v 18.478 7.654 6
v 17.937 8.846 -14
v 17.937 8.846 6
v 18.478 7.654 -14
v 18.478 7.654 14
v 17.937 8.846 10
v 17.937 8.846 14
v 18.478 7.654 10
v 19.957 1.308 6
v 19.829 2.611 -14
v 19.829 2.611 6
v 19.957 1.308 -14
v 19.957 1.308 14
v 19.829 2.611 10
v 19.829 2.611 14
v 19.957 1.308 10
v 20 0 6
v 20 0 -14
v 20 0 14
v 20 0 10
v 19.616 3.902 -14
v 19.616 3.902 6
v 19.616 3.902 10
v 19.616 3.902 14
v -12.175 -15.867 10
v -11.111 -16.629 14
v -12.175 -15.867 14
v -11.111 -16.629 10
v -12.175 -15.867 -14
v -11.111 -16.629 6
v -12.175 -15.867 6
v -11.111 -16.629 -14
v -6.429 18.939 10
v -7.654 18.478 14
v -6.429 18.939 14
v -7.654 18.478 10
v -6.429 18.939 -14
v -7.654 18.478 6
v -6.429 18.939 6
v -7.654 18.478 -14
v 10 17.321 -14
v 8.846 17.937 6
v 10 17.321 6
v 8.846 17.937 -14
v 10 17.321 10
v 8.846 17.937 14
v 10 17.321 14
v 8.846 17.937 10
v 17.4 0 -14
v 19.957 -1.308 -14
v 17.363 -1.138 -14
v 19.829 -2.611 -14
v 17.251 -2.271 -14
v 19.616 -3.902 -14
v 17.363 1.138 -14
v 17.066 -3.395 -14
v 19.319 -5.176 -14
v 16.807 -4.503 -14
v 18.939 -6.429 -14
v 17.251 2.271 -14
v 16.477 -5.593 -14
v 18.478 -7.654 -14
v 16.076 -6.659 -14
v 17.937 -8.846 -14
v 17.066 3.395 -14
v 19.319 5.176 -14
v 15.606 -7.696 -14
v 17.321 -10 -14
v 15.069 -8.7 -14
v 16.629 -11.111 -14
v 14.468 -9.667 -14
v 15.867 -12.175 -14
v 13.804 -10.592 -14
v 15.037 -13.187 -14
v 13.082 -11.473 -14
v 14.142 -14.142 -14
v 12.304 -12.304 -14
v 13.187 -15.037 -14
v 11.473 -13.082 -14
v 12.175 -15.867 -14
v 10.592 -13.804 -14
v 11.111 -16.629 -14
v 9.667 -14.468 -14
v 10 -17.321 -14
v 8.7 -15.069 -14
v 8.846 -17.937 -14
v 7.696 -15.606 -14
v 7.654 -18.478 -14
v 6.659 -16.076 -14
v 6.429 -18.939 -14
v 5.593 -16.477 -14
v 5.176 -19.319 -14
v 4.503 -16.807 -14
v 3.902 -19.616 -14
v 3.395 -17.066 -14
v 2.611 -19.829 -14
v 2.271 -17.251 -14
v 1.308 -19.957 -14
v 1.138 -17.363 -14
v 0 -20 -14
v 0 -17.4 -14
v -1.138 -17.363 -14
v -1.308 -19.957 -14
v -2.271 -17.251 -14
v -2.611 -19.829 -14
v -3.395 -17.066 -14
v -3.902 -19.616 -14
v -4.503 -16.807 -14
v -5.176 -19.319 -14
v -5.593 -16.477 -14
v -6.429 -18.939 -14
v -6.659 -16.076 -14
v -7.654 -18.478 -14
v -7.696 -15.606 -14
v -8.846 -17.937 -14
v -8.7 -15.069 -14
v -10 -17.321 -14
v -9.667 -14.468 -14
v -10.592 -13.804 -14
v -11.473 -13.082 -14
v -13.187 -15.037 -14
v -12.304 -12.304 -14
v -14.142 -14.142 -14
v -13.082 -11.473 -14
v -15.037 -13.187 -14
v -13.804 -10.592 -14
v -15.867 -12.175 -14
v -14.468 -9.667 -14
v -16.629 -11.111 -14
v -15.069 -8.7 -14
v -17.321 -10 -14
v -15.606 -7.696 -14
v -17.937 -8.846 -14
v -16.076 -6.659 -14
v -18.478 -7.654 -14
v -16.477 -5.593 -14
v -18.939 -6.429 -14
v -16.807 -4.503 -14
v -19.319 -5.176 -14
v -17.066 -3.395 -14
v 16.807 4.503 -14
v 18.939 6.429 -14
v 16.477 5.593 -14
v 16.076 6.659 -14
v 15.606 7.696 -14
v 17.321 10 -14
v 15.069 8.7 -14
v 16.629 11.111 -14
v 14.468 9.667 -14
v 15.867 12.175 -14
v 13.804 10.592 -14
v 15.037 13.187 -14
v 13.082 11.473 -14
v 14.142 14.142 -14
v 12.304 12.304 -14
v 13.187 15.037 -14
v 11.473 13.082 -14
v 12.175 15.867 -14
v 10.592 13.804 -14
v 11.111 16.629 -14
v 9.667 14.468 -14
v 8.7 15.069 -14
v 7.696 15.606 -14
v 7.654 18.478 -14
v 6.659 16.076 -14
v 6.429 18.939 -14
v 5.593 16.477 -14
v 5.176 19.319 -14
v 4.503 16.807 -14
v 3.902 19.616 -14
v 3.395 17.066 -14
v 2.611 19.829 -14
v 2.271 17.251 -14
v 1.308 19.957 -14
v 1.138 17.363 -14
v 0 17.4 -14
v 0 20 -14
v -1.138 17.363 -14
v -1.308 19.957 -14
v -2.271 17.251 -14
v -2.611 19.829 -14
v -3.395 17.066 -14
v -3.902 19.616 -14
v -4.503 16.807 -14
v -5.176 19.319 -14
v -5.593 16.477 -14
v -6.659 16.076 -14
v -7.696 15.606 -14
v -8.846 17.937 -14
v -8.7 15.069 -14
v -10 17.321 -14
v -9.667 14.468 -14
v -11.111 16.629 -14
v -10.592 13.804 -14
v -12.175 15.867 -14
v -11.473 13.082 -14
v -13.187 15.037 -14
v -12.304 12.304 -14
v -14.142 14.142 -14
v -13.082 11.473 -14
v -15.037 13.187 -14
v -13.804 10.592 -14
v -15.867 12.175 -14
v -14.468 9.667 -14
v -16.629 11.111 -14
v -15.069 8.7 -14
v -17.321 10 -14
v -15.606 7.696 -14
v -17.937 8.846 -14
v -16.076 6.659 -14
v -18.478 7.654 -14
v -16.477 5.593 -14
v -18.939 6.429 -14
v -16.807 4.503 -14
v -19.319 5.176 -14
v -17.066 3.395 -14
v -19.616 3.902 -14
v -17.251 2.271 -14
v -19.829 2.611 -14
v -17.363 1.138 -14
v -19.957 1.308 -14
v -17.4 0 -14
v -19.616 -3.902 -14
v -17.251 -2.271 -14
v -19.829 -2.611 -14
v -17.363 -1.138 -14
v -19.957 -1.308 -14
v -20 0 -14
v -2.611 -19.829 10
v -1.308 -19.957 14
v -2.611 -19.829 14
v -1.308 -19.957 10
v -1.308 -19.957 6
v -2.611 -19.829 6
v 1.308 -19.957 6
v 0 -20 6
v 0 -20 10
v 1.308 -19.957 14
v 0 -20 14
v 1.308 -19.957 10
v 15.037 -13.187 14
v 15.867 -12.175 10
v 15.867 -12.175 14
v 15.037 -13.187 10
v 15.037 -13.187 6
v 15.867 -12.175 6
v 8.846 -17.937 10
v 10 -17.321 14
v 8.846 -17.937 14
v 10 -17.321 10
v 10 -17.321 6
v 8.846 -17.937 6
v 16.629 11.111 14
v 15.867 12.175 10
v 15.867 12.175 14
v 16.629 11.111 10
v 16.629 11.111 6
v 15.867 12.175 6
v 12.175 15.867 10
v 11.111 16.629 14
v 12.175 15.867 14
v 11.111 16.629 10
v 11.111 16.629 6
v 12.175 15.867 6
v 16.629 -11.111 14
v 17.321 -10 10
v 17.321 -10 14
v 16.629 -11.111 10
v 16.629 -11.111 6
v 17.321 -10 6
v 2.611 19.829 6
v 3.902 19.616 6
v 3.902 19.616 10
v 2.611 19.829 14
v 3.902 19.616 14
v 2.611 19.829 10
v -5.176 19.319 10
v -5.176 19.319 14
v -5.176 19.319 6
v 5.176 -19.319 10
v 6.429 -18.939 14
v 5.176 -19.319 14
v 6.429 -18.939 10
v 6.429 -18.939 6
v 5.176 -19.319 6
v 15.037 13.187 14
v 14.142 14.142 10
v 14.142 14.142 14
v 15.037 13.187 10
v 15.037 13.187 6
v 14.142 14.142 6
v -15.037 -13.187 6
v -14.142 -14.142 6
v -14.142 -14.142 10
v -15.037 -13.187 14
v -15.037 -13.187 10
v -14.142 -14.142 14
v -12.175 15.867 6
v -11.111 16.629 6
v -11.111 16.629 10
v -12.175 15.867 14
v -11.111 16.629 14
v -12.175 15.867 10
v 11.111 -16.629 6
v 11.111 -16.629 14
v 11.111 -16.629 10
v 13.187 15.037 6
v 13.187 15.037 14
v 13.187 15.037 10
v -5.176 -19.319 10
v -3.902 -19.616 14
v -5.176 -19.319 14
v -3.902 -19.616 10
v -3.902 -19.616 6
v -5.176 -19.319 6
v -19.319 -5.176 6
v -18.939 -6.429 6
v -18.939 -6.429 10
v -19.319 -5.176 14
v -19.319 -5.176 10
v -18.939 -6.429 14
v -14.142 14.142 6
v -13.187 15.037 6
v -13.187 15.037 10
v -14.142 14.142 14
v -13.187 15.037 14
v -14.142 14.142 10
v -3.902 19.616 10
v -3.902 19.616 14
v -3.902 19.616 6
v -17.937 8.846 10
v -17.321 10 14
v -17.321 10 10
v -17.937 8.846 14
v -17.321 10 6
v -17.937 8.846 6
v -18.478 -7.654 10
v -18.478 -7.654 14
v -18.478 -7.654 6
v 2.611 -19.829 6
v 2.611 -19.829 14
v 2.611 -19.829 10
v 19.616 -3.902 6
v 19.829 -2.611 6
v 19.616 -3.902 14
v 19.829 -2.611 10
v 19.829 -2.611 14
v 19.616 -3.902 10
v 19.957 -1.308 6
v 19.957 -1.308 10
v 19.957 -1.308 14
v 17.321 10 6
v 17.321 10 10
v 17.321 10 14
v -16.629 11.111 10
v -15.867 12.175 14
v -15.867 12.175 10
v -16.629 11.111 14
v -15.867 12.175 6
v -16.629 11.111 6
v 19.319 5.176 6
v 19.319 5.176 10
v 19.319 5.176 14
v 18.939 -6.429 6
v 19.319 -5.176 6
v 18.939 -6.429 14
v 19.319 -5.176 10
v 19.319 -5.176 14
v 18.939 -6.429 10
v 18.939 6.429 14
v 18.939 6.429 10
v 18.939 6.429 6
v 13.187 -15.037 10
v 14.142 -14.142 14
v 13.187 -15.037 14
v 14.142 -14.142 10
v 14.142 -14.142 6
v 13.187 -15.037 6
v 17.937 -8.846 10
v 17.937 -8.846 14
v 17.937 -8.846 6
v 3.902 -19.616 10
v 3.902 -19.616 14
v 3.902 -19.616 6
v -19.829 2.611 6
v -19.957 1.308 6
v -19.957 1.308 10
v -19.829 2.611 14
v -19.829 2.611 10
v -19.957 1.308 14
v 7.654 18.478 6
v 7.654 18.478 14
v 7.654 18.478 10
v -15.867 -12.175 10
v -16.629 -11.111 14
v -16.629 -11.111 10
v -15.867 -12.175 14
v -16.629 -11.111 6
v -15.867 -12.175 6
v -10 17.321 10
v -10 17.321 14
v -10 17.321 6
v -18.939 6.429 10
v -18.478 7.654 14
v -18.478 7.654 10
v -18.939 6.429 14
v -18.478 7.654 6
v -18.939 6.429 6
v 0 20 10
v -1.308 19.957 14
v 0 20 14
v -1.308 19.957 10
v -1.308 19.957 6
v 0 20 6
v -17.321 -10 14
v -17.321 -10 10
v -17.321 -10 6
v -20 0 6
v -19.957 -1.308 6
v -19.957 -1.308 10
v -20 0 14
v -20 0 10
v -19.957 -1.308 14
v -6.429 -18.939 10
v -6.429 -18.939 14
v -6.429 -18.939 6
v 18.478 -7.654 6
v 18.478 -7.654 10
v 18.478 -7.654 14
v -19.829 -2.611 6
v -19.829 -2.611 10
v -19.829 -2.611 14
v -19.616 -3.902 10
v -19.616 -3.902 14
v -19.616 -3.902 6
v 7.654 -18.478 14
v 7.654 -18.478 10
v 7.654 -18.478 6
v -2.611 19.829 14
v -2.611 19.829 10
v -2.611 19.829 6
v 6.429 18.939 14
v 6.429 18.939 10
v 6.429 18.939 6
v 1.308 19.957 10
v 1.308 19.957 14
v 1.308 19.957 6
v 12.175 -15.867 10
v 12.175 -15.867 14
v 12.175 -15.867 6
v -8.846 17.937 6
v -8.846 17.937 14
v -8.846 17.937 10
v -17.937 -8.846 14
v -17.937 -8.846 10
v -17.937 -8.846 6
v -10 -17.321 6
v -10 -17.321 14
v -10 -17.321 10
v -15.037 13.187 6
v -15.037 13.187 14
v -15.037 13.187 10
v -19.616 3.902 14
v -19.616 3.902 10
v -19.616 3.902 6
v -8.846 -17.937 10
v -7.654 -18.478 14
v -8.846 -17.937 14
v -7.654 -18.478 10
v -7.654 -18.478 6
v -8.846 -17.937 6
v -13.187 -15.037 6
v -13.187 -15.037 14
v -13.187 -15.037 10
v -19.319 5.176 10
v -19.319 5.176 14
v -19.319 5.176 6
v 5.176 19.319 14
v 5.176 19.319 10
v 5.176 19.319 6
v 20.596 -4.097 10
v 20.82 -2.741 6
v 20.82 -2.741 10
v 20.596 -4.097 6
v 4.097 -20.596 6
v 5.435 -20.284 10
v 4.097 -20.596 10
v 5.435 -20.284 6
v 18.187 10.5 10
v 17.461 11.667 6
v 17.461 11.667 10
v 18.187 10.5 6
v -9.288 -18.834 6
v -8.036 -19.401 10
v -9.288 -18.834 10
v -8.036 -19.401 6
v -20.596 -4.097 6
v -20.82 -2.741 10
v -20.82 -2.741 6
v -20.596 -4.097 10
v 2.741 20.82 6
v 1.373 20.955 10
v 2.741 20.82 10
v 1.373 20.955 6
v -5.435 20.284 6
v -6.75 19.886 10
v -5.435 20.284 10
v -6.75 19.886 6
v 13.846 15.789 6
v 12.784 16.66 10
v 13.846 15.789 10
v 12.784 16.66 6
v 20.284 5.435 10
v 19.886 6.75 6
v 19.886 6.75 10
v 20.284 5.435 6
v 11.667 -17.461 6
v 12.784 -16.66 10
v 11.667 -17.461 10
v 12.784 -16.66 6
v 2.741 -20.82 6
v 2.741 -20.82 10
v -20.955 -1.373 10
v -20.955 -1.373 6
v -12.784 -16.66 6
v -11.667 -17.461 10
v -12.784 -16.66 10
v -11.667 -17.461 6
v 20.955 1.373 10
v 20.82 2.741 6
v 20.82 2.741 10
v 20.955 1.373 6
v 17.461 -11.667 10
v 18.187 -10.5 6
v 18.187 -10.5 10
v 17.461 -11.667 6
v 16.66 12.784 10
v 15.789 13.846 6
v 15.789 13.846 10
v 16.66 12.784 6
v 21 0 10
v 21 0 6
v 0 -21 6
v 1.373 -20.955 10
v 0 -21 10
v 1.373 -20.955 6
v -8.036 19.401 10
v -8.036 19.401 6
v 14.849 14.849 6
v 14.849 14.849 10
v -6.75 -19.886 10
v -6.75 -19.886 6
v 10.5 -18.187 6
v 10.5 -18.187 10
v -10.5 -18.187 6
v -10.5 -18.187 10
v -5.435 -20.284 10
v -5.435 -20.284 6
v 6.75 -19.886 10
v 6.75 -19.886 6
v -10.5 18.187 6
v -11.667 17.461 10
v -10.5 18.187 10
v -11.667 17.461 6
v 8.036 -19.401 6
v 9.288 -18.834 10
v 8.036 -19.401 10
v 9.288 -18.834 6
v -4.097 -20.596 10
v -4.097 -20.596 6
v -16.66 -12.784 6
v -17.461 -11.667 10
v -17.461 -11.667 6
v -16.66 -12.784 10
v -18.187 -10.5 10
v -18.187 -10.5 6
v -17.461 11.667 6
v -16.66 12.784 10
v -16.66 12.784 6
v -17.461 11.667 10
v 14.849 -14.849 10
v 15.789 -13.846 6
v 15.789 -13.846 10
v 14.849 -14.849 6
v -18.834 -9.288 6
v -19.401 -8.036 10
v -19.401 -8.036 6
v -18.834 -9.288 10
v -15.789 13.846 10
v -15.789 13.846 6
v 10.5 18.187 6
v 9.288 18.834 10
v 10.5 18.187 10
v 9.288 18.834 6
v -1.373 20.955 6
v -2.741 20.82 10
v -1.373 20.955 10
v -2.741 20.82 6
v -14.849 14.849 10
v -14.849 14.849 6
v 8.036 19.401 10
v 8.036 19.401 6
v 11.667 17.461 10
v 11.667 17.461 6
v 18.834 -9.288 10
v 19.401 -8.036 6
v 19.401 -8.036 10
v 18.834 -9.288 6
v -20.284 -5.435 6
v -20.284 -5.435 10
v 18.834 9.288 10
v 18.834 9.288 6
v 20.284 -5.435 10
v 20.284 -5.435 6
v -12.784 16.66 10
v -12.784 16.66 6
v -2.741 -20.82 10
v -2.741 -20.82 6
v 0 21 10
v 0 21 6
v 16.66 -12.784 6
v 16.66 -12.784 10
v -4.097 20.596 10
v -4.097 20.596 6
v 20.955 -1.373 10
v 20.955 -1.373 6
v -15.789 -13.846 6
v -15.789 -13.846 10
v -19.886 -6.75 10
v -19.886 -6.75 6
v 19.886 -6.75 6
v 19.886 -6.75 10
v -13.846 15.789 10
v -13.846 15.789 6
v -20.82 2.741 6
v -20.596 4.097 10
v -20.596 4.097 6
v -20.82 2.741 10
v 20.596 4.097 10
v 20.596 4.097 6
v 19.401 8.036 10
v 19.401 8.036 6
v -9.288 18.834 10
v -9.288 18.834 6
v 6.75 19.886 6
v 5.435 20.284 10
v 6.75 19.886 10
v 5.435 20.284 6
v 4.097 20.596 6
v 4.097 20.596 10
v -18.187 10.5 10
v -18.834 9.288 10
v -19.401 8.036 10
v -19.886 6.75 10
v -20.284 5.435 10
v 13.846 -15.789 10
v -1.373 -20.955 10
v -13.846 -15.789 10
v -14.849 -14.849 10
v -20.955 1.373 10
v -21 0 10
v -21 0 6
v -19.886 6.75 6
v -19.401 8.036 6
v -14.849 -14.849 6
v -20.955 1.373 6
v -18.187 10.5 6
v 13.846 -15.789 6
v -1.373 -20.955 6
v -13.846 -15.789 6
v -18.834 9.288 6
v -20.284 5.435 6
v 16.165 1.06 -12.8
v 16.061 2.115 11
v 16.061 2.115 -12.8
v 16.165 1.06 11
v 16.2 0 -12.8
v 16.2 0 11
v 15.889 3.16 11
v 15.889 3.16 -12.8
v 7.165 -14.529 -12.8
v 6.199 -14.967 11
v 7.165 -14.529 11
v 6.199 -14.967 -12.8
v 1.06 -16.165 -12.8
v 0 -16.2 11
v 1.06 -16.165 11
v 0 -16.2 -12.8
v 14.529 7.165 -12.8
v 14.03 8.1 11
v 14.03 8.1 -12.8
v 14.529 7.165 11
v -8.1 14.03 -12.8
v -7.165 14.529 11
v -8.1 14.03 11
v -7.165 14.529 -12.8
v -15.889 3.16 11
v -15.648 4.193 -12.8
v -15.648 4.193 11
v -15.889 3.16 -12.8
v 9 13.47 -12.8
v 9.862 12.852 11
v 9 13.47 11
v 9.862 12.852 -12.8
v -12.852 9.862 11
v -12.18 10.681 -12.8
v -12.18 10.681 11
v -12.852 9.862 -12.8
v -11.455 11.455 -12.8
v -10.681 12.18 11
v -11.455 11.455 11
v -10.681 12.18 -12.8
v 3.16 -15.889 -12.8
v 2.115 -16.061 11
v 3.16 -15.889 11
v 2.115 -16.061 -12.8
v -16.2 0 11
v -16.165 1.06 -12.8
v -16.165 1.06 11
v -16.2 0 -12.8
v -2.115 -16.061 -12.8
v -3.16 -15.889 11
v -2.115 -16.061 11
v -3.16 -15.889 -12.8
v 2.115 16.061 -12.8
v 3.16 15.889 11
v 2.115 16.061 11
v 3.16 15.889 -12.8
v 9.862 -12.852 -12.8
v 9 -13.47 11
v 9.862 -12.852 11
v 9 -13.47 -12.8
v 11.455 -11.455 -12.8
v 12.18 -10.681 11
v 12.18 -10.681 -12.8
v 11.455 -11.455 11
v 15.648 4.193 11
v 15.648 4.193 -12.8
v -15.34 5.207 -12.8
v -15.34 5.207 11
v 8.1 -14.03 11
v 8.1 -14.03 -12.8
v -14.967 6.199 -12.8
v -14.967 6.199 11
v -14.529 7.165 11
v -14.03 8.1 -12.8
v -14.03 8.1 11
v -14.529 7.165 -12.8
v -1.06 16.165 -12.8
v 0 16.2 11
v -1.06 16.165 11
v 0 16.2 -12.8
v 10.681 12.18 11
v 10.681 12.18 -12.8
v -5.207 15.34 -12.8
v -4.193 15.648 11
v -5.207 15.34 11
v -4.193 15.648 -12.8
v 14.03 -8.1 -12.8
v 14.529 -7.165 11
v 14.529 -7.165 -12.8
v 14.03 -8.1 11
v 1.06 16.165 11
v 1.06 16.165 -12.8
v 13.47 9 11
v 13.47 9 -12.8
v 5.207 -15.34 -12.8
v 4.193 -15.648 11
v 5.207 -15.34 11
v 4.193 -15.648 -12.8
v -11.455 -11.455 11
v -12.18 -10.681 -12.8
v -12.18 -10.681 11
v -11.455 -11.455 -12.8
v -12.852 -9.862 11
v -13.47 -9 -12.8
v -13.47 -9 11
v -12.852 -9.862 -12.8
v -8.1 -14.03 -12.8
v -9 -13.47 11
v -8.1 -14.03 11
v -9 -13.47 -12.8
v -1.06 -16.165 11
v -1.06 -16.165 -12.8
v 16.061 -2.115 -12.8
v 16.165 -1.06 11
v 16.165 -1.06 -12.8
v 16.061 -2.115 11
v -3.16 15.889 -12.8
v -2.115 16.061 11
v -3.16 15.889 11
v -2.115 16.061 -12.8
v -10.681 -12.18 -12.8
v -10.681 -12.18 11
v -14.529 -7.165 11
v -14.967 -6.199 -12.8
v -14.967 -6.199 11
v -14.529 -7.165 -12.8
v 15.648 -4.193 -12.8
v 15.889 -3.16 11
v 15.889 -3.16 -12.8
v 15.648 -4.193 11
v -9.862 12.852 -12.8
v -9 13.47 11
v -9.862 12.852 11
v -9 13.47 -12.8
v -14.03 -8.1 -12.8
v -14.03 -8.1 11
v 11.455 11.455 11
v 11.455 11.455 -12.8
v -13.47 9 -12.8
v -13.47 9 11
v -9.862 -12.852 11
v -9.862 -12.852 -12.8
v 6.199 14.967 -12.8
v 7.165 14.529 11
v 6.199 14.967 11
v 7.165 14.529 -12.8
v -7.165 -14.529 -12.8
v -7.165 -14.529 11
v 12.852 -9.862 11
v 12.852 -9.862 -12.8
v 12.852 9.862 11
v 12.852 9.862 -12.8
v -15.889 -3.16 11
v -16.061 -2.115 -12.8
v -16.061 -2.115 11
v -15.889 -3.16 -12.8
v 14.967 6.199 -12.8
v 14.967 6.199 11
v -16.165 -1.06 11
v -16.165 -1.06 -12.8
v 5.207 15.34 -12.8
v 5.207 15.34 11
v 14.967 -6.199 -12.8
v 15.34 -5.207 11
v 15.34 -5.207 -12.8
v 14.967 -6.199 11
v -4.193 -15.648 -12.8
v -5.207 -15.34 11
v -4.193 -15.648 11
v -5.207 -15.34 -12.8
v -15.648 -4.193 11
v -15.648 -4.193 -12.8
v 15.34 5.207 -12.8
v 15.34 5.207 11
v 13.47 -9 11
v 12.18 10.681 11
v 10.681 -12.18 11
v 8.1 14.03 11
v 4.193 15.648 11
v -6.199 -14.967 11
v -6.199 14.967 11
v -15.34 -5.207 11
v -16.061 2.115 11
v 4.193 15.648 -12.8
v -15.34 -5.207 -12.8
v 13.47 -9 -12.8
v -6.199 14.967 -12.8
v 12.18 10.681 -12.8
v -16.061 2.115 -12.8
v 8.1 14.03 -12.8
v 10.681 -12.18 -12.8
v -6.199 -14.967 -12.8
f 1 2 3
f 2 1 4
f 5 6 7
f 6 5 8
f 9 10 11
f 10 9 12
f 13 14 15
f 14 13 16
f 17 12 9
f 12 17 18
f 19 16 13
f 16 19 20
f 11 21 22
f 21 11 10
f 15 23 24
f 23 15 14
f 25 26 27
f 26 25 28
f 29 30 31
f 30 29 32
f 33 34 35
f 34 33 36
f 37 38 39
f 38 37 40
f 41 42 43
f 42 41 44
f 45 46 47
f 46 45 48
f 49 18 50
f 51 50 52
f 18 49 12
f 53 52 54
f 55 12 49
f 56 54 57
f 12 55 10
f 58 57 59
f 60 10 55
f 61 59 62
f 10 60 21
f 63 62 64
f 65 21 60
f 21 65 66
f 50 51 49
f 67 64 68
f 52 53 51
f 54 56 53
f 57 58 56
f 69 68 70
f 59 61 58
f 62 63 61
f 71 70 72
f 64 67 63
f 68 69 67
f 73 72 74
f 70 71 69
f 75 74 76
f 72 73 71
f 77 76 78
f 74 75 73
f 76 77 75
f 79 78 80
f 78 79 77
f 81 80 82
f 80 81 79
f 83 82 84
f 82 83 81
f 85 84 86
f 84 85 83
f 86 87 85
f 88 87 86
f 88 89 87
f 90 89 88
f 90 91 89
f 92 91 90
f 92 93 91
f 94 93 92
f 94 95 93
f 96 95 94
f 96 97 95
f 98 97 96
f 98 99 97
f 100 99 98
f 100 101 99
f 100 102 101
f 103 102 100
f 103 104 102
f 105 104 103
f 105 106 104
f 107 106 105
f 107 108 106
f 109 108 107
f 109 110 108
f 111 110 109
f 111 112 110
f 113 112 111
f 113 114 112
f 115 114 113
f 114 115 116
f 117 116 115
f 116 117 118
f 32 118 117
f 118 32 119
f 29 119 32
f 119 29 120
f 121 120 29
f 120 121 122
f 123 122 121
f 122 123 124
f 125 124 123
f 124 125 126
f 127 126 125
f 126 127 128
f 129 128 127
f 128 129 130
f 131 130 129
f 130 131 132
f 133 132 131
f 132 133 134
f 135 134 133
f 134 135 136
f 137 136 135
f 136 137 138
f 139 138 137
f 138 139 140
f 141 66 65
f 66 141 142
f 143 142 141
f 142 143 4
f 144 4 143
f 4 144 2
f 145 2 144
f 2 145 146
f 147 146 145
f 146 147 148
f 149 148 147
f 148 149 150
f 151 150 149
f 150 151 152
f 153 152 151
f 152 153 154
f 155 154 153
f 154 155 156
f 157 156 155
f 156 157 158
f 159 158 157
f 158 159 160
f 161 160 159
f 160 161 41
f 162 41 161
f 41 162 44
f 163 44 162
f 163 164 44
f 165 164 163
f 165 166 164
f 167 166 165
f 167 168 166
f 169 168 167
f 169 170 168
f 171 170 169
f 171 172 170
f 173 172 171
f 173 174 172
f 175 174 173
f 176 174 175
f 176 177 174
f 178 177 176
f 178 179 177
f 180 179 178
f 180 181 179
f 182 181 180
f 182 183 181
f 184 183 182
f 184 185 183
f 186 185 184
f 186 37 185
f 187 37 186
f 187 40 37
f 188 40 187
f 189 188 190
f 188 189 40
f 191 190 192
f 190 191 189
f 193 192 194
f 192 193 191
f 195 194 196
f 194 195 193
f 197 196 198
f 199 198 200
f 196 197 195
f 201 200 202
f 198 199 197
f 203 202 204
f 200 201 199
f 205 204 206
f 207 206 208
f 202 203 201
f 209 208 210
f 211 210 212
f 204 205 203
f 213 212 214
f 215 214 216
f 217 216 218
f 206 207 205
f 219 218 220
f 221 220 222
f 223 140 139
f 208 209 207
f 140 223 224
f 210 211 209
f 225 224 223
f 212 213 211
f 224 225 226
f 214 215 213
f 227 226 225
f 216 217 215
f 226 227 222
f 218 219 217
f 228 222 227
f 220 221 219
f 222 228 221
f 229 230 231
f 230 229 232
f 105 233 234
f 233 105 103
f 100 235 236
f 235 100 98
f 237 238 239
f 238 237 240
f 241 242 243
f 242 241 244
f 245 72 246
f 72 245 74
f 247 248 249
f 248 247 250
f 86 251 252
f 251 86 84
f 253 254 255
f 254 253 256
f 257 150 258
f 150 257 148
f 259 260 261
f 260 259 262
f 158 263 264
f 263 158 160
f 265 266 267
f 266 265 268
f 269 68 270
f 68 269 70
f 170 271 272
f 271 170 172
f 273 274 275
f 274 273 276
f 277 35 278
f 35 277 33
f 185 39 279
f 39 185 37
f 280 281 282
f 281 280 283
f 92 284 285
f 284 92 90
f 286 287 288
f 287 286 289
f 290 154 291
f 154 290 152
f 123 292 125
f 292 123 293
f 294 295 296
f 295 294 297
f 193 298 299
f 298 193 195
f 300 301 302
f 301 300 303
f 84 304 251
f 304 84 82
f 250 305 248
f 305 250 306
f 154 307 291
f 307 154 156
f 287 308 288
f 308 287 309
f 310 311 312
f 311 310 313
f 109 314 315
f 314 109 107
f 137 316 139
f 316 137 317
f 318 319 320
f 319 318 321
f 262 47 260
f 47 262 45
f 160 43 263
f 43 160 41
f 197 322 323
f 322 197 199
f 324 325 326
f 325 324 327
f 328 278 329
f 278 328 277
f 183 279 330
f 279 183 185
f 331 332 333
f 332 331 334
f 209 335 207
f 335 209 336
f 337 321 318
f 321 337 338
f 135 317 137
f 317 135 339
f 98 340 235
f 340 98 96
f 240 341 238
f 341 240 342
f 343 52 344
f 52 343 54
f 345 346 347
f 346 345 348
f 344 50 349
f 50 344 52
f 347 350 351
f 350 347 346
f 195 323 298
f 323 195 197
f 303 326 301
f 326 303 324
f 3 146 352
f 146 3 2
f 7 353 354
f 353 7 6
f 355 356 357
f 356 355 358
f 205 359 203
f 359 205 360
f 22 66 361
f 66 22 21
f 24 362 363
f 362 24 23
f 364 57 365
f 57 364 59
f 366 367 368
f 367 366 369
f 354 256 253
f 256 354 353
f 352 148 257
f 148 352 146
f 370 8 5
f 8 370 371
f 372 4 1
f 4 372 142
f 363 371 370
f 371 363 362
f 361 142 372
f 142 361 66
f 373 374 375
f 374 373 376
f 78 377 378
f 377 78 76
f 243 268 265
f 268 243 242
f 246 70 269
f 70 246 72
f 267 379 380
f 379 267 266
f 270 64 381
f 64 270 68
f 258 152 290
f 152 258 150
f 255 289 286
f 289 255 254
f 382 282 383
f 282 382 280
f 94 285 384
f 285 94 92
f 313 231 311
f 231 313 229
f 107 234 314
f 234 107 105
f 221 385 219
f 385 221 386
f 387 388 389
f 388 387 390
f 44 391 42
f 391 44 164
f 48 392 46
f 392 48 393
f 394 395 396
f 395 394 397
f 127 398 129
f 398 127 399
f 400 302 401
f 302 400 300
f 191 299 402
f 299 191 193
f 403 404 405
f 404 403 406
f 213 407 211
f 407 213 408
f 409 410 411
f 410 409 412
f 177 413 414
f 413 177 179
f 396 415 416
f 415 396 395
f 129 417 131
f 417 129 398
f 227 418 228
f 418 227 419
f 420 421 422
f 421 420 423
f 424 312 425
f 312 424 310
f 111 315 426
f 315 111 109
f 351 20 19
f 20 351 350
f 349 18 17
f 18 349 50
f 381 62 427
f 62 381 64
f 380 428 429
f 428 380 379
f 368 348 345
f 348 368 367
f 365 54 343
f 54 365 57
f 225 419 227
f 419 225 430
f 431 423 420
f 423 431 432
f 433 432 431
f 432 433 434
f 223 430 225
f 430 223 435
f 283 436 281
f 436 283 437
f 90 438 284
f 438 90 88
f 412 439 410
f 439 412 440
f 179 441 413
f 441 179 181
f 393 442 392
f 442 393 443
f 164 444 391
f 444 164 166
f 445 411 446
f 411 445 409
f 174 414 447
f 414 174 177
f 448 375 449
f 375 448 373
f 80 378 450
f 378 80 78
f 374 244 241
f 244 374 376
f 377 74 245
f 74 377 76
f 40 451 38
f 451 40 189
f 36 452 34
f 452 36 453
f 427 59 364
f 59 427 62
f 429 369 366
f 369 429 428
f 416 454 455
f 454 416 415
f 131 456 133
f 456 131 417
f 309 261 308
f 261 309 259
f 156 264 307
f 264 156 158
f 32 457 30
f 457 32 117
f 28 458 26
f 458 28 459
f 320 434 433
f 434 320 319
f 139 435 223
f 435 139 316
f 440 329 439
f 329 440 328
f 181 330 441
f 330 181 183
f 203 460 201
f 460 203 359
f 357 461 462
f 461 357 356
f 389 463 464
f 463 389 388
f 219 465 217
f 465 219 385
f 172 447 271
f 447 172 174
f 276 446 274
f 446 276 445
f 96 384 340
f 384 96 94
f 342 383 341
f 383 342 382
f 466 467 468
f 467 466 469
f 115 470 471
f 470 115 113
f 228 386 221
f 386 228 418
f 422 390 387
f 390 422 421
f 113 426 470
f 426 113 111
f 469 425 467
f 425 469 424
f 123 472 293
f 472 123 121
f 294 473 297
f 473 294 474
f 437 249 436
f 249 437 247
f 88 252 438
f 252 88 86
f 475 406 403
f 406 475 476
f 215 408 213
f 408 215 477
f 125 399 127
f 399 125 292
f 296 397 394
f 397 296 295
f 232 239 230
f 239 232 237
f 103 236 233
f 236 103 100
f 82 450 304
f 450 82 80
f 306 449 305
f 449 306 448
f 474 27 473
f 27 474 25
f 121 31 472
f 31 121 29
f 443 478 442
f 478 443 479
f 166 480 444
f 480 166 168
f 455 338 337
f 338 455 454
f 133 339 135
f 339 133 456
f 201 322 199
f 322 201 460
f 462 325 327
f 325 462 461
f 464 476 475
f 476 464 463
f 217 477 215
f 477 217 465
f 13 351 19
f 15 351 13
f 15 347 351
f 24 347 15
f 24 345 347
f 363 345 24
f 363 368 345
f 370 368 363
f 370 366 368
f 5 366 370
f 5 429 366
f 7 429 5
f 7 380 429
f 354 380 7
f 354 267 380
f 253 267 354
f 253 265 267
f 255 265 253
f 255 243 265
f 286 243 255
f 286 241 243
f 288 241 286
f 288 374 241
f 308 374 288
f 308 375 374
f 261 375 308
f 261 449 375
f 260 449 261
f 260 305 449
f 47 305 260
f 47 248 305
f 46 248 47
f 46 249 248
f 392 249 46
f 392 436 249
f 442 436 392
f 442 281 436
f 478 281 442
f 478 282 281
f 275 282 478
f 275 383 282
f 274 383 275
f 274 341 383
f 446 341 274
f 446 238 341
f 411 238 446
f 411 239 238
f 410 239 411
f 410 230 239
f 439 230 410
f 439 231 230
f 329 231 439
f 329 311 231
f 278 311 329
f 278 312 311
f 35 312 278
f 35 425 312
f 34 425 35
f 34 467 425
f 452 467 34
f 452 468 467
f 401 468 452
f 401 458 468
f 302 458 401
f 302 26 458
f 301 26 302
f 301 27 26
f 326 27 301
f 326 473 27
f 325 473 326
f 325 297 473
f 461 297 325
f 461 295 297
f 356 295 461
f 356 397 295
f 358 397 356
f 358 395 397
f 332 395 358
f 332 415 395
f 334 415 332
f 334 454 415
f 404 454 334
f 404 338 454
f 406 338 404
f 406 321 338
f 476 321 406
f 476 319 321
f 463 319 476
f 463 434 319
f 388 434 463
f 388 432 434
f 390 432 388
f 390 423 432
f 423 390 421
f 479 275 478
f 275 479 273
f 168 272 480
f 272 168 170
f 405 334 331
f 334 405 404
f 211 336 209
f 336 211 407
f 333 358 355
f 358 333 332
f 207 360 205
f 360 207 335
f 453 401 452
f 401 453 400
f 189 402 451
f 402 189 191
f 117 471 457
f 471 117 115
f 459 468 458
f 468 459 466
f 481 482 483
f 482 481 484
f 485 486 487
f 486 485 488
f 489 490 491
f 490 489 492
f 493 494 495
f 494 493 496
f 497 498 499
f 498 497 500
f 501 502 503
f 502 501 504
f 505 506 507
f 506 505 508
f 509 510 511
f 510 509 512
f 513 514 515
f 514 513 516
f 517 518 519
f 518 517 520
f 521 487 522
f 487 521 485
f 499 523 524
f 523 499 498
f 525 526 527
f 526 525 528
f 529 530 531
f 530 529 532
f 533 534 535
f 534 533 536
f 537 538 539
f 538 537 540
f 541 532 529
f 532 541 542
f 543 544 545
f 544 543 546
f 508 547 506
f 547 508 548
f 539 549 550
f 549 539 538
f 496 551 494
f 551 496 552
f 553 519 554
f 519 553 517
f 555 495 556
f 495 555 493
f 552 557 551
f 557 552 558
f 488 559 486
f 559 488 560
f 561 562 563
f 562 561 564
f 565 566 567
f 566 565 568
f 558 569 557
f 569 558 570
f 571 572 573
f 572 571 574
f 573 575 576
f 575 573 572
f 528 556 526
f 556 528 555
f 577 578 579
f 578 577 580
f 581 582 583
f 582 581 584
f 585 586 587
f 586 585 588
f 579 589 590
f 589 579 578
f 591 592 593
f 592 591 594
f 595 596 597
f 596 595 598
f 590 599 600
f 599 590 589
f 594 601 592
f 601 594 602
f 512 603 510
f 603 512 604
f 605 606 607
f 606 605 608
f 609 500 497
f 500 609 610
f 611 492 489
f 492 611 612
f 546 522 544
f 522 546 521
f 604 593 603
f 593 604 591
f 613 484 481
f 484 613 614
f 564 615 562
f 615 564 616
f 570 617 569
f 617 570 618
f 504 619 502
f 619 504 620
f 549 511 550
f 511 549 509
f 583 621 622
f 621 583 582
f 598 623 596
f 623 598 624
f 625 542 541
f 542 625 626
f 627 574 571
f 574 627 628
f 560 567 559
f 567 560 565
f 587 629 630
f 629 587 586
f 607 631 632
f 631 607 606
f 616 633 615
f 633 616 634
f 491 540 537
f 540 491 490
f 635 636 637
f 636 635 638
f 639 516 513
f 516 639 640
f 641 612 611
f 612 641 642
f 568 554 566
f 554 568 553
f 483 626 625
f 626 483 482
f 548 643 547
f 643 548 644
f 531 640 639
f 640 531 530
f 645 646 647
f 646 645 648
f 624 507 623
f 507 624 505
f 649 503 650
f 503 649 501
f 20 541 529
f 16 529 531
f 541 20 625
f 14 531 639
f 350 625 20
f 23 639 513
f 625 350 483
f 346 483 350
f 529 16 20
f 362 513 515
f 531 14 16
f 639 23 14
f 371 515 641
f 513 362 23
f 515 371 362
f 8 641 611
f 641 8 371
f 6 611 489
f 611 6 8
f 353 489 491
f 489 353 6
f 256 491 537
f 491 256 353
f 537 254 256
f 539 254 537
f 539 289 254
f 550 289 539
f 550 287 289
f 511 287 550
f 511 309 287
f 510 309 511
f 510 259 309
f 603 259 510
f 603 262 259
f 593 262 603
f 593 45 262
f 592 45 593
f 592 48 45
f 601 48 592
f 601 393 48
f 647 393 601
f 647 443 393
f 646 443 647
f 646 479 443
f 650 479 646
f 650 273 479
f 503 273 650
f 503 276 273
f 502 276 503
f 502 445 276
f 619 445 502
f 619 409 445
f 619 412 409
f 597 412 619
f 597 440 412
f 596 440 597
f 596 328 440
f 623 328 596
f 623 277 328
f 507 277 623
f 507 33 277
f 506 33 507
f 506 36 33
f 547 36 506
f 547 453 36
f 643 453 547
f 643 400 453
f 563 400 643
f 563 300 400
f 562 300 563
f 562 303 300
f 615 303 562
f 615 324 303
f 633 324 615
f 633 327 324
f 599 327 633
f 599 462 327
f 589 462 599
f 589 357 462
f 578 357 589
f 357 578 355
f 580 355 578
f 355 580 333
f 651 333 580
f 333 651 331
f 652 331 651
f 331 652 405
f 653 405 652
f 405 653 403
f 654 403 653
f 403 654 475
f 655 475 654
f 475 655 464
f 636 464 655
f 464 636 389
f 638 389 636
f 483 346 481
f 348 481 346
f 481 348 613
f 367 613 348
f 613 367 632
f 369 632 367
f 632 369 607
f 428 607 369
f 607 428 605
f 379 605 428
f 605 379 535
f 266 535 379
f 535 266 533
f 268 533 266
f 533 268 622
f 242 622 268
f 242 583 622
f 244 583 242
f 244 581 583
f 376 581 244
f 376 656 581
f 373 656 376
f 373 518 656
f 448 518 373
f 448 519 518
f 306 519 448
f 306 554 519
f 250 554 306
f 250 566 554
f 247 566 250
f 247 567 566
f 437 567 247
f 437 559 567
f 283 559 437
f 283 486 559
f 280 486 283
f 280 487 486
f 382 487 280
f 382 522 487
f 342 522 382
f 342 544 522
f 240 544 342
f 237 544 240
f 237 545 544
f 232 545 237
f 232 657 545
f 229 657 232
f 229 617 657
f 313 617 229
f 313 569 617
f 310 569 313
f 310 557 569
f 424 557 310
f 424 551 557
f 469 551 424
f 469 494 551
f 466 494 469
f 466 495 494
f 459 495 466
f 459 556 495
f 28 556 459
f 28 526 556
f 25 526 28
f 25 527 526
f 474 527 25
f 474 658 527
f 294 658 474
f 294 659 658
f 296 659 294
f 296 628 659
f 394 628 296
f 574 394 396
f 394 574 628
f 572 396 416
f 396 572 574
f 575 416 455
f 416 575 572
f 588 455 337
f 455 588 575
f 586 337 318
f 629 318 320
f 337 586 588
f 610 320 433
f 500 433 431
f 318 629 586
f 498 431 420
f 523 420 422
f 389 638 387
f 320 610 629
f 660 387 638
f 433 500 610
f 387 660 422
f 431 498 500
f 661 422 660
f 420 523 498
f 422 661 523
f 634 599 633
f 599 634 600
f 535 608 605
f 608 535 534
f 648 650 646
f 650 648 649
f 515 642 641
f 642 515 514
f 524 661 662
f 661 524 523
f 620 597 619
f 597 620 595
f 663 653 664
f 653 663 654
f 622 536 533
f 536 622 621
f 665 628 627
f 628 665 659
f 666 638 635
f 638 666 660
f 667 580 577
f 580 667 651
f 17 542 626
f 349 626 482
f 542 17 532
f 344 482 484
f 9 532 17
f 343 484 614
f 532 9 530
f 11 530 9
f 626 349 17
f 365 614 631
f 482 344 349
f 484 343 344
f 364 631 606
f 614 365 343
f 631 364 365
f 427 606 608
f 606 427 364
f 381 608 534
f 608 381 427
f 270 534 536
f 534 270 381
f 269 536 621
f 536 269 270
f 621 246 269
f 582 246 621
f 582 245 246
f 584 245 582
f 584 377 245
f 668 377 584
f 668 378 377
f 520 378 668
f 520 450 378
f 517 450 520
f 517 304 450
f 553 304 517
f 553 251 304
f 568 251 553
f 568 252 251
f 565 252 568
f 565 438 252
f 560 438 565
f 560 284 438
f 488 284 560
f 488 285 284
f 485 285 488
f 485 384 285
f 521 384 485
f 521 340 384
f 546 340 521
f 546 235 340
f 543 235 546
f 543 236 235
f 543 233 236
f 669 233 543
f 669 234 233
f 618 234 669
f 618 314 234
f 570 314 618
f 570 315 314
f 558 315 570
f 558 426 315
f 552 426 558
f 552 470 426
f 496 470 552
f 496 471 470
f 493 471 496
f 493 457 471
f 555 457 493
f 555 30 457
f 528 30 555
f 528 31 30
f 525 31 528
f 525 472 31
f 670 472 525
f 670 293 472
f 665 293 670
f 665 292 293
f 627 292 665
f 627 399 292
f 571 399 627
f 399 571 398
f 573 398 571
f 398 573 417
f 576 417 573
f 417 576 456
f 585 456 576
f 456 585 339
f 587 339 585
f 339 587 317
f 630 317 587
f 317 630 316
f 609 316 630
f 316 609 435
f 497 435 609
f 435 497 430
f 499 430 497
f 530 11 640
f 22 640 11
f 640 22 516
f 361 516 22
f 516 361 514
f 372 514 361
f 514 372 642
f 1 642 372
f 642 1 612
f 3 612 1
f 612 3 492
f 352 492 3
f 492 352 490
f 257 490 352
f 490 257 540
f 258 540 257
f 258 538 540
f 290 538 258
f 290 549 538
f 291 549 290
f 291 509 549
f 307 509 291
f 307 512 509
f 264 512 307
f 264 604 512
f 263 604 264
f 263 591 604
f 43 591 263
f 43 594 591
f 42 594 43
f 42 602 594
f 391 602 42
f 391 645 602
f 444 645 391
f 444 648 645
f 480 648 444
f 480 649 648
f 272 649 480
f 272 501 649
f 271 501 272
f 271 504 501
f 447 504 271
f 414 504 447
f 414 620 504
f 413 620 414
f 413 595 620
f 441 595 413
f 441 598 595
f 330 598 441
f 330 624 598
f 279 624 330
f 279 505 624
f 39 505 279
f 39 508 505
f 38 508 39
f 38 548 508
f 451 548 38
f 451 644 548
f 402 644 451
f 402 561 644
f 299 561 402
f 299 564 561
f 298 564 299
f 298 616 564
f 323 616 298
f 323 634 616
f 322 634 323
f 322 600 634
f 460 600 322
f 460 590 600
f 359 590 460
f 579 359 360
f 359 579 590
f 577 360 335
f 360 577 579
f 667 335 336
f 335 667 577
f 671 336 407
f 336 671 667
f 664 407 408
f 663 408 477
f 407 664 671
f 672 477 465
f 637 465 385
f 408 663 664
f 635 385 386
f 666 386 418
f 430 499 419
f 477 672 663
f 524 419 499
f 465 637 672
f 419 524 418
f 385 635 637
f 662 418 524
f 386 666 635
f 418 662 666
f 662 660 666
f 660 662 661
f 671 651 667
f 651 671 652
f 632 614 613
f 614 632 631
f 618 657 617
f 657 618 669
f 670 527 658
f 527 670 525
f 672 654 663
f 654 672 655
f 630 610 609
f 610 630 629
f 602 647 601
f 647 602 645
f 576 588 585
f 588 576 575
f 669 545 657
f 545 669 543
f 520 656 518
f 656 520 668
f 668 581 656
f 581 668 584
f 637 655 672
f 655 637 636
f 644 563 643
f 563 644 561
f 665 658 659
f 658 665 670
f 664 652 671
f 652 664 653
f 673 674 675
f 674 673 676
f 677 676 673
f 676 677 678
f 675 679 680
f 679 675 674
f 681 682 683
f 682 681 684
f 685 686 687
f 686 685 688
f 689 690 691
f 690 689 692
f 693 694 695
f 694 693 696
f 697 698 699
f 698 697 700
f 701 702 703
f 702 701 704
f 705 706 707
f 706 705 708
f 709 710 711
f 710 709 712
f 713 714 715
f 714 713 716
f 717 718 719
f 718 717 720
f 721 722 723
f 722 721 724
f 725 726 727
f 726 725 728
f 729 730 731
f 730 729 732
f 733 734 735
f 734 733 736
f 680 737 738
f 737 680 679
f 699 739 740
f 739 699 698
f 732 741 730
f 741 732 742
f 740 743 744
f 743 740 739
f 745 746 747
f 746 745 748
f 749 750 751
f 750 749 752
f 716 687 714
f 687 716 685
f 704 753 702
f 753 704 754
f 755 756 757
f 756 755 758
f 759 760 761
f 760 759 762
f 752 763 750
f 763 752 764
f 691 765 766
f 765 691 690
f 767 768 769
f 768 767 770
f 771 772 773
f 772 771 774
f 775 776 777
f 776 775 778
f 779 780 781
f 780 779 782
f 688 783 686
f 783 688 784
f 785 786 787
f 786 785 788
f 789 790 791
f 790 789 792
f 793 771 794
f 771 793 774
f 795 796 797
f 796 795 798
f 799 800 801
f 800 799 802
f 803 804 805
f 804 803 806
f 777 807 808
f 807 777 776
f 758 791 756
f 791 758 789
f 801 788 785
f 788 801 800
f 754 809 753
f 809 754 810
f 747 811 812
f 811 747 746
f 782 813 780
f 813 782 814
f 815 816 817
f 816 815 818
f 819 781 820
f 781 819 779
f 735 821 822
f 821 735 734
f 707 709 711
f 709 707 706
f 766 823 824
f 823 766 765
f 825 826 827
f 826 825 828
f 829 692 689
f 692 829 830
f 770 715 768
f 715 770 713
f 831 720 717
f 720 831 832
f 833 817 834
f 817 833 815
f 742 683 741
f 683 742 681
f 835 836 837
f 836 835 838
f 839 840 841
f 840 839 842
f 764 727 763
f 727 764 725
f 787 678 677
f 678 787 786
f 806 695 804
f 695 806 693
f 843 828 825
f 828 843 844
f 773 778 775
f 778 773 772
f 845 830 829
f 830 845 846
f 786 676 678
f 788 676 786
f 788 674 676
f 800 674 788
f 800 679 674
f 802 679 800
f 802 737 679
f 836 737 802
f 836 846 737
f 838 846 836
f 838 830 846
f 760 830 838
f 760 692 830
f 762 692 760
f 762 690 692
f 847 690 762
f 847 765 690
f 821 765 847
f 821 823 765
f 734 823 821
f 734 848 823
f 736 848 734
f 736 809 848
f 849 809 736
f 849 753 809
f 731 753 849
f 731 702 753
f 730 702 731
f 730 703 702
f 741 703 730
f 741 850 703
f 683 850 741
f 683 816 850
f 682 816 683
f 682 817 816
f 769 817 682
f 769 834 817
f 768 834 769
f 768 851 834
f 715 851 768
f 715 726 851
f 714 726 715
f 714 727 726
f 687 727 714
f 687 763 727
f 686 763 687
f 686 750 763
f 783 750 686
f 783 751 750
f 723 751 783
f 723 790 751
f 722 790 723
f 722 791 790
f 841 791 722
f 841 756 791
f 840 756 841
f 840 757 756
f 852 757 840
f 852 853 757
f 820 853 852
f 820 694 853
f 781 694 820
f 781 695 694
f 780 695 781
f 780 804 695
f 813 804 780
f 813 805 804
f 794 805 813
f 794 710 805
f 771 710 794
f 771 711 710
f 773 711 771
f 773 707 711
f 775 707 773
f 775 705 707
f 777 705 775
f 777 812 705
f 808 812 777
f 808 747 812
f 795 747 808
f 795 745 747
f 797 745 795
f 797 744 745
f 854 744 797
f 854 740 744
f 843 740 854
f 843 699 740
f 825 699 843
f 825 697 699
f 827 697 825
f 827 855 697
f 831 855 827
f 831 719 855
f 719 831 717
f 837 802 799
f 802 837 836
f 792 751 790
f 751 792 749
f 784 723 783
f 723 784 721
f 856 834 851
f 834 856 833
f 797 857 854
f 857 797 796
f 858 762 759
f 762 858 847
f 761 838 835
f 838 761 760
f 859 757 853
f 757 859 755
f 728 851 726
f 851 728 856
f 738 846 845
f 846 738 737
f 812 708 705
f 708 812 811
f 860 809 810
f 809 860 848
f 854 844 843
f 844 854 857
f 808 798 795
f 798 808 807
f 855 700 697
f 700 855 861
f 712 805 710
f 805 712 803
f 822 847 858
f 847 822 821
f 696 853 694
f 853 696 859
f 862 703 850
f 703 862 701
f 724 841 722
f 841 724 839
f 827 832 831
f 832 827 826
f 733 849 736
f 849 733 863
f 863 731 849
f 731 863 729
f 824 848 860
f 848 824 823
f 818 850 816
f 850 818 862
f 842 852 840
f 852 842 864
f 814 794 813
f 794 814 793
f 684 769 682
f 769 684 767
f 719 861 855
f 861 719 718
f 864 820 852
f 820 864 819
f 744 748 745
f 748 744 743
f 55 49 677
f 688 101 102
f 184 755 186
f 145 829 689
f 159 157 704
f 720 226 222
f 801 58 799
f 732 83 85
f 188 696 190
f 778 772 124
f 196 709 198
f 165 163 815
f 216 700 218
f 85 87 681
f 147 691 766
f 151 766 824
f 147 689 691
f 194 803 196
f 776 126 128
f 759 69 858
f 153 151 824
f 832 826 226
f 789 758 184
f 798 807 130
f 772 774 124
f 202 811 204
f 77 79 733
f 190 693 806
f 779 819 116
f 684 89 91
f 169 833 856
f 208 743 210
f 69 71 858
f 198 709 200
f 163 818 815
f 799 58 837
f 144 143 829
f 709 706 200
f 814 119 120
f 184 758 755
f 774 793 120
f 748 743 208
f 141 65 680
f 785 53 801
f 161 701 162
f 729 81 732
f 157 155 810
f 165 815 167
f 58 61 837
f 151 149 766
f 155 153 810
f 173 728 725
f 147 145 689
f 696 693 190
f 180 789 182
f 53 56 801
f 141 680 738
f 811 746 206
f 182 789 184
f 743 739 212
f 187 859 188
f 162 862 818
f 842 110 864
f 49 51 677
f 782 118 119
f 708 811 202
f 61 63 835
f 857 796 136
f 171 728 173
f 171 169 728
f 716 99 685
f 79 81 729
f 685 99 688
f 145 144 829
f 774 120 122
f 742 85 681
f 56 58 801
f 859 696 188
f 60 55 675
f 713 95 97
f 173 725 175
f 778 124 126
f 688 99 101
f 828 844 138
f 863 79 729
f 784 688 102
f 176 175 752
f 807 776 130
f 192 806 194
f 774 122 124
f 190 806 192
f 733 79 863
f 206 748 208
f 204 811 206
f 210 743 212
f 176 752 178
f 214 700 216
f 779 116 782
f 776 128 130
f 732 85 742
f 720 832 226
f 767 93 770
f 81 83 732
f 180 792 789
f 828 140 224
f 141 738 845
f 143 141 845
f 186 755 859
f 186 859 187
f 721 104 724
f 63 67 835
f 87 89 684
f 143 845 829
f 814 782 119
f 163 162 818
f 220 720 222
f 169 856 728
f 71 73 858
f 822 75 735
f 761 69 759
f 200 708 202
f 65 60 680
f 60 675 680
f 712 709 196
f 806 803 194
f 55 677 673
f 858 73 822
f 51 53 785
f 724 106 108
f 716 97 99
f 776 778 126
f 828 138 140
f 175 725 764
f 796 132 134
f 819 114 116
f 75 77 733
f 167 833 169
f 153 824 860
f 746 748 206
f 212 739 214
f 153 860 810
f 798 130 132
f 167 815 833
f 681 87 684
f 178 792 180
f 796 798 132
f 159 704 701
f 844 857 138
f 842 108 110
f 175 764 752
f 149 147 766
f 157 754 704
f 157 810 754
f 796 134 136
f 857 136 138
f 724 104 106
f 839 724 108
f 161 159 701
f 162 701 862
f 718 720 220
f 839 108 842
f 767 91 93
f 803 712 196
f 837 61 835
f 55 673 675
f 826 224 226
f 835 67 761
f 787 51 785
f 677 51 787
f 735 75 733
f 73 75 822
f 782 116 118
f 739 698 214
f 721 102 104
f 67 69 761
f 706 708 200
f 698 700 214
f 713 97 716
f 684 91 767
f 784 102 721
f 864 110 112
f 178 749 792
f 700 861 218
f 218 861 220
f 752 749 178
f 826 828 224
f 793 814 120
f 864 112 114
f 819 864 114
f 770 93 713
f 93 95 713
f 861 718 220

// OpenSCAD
$fn=96;

module ht32_cap(
    outer_d=40,
    inner_d=32.4,
    height=28,
    wall=3.2,
    top_th=3.0,
    lip_h=10,
    lip_th=1.2,
    chamfer=1.2
){
    difference(){
        union(){
            // Outer body
            cylinder(d=outer_d, h=height, center=true);

            // Small outer grip ring
            translate([0,0, height/2 - 6])
                cylinder(d=outer_d+2.0, h=4, center=true);

            // Bottom chamfer ring (outer)
            translate([0,0, -height/2 + chamfer/2])
                cylinder(d1=outer_d-2*chamfer, d2=outer_d, h=chamfer, center=true);
        }

        // Main cavity (open at bottom)
        translate([0,0, -height/2 + (height-top_th)/2])
            cylinder(d=inner_d, h=height-top_th, center=true);

        // Inner lead-in chamfer at opening
        translate([0,0, -height/2 + chamfer/2])
            cylinder(d1=inner_d+2*chamfer, d2=inner_d, h=chamfer, center=true);

        // Inner retention lip (slight constriction near opening)
        translate([0,0, -height/2 + lip_h/2])
            cylinder(d=inner_d-2*lip_th, h=lip_h, center=true);
    }
}

ht32_cap();
